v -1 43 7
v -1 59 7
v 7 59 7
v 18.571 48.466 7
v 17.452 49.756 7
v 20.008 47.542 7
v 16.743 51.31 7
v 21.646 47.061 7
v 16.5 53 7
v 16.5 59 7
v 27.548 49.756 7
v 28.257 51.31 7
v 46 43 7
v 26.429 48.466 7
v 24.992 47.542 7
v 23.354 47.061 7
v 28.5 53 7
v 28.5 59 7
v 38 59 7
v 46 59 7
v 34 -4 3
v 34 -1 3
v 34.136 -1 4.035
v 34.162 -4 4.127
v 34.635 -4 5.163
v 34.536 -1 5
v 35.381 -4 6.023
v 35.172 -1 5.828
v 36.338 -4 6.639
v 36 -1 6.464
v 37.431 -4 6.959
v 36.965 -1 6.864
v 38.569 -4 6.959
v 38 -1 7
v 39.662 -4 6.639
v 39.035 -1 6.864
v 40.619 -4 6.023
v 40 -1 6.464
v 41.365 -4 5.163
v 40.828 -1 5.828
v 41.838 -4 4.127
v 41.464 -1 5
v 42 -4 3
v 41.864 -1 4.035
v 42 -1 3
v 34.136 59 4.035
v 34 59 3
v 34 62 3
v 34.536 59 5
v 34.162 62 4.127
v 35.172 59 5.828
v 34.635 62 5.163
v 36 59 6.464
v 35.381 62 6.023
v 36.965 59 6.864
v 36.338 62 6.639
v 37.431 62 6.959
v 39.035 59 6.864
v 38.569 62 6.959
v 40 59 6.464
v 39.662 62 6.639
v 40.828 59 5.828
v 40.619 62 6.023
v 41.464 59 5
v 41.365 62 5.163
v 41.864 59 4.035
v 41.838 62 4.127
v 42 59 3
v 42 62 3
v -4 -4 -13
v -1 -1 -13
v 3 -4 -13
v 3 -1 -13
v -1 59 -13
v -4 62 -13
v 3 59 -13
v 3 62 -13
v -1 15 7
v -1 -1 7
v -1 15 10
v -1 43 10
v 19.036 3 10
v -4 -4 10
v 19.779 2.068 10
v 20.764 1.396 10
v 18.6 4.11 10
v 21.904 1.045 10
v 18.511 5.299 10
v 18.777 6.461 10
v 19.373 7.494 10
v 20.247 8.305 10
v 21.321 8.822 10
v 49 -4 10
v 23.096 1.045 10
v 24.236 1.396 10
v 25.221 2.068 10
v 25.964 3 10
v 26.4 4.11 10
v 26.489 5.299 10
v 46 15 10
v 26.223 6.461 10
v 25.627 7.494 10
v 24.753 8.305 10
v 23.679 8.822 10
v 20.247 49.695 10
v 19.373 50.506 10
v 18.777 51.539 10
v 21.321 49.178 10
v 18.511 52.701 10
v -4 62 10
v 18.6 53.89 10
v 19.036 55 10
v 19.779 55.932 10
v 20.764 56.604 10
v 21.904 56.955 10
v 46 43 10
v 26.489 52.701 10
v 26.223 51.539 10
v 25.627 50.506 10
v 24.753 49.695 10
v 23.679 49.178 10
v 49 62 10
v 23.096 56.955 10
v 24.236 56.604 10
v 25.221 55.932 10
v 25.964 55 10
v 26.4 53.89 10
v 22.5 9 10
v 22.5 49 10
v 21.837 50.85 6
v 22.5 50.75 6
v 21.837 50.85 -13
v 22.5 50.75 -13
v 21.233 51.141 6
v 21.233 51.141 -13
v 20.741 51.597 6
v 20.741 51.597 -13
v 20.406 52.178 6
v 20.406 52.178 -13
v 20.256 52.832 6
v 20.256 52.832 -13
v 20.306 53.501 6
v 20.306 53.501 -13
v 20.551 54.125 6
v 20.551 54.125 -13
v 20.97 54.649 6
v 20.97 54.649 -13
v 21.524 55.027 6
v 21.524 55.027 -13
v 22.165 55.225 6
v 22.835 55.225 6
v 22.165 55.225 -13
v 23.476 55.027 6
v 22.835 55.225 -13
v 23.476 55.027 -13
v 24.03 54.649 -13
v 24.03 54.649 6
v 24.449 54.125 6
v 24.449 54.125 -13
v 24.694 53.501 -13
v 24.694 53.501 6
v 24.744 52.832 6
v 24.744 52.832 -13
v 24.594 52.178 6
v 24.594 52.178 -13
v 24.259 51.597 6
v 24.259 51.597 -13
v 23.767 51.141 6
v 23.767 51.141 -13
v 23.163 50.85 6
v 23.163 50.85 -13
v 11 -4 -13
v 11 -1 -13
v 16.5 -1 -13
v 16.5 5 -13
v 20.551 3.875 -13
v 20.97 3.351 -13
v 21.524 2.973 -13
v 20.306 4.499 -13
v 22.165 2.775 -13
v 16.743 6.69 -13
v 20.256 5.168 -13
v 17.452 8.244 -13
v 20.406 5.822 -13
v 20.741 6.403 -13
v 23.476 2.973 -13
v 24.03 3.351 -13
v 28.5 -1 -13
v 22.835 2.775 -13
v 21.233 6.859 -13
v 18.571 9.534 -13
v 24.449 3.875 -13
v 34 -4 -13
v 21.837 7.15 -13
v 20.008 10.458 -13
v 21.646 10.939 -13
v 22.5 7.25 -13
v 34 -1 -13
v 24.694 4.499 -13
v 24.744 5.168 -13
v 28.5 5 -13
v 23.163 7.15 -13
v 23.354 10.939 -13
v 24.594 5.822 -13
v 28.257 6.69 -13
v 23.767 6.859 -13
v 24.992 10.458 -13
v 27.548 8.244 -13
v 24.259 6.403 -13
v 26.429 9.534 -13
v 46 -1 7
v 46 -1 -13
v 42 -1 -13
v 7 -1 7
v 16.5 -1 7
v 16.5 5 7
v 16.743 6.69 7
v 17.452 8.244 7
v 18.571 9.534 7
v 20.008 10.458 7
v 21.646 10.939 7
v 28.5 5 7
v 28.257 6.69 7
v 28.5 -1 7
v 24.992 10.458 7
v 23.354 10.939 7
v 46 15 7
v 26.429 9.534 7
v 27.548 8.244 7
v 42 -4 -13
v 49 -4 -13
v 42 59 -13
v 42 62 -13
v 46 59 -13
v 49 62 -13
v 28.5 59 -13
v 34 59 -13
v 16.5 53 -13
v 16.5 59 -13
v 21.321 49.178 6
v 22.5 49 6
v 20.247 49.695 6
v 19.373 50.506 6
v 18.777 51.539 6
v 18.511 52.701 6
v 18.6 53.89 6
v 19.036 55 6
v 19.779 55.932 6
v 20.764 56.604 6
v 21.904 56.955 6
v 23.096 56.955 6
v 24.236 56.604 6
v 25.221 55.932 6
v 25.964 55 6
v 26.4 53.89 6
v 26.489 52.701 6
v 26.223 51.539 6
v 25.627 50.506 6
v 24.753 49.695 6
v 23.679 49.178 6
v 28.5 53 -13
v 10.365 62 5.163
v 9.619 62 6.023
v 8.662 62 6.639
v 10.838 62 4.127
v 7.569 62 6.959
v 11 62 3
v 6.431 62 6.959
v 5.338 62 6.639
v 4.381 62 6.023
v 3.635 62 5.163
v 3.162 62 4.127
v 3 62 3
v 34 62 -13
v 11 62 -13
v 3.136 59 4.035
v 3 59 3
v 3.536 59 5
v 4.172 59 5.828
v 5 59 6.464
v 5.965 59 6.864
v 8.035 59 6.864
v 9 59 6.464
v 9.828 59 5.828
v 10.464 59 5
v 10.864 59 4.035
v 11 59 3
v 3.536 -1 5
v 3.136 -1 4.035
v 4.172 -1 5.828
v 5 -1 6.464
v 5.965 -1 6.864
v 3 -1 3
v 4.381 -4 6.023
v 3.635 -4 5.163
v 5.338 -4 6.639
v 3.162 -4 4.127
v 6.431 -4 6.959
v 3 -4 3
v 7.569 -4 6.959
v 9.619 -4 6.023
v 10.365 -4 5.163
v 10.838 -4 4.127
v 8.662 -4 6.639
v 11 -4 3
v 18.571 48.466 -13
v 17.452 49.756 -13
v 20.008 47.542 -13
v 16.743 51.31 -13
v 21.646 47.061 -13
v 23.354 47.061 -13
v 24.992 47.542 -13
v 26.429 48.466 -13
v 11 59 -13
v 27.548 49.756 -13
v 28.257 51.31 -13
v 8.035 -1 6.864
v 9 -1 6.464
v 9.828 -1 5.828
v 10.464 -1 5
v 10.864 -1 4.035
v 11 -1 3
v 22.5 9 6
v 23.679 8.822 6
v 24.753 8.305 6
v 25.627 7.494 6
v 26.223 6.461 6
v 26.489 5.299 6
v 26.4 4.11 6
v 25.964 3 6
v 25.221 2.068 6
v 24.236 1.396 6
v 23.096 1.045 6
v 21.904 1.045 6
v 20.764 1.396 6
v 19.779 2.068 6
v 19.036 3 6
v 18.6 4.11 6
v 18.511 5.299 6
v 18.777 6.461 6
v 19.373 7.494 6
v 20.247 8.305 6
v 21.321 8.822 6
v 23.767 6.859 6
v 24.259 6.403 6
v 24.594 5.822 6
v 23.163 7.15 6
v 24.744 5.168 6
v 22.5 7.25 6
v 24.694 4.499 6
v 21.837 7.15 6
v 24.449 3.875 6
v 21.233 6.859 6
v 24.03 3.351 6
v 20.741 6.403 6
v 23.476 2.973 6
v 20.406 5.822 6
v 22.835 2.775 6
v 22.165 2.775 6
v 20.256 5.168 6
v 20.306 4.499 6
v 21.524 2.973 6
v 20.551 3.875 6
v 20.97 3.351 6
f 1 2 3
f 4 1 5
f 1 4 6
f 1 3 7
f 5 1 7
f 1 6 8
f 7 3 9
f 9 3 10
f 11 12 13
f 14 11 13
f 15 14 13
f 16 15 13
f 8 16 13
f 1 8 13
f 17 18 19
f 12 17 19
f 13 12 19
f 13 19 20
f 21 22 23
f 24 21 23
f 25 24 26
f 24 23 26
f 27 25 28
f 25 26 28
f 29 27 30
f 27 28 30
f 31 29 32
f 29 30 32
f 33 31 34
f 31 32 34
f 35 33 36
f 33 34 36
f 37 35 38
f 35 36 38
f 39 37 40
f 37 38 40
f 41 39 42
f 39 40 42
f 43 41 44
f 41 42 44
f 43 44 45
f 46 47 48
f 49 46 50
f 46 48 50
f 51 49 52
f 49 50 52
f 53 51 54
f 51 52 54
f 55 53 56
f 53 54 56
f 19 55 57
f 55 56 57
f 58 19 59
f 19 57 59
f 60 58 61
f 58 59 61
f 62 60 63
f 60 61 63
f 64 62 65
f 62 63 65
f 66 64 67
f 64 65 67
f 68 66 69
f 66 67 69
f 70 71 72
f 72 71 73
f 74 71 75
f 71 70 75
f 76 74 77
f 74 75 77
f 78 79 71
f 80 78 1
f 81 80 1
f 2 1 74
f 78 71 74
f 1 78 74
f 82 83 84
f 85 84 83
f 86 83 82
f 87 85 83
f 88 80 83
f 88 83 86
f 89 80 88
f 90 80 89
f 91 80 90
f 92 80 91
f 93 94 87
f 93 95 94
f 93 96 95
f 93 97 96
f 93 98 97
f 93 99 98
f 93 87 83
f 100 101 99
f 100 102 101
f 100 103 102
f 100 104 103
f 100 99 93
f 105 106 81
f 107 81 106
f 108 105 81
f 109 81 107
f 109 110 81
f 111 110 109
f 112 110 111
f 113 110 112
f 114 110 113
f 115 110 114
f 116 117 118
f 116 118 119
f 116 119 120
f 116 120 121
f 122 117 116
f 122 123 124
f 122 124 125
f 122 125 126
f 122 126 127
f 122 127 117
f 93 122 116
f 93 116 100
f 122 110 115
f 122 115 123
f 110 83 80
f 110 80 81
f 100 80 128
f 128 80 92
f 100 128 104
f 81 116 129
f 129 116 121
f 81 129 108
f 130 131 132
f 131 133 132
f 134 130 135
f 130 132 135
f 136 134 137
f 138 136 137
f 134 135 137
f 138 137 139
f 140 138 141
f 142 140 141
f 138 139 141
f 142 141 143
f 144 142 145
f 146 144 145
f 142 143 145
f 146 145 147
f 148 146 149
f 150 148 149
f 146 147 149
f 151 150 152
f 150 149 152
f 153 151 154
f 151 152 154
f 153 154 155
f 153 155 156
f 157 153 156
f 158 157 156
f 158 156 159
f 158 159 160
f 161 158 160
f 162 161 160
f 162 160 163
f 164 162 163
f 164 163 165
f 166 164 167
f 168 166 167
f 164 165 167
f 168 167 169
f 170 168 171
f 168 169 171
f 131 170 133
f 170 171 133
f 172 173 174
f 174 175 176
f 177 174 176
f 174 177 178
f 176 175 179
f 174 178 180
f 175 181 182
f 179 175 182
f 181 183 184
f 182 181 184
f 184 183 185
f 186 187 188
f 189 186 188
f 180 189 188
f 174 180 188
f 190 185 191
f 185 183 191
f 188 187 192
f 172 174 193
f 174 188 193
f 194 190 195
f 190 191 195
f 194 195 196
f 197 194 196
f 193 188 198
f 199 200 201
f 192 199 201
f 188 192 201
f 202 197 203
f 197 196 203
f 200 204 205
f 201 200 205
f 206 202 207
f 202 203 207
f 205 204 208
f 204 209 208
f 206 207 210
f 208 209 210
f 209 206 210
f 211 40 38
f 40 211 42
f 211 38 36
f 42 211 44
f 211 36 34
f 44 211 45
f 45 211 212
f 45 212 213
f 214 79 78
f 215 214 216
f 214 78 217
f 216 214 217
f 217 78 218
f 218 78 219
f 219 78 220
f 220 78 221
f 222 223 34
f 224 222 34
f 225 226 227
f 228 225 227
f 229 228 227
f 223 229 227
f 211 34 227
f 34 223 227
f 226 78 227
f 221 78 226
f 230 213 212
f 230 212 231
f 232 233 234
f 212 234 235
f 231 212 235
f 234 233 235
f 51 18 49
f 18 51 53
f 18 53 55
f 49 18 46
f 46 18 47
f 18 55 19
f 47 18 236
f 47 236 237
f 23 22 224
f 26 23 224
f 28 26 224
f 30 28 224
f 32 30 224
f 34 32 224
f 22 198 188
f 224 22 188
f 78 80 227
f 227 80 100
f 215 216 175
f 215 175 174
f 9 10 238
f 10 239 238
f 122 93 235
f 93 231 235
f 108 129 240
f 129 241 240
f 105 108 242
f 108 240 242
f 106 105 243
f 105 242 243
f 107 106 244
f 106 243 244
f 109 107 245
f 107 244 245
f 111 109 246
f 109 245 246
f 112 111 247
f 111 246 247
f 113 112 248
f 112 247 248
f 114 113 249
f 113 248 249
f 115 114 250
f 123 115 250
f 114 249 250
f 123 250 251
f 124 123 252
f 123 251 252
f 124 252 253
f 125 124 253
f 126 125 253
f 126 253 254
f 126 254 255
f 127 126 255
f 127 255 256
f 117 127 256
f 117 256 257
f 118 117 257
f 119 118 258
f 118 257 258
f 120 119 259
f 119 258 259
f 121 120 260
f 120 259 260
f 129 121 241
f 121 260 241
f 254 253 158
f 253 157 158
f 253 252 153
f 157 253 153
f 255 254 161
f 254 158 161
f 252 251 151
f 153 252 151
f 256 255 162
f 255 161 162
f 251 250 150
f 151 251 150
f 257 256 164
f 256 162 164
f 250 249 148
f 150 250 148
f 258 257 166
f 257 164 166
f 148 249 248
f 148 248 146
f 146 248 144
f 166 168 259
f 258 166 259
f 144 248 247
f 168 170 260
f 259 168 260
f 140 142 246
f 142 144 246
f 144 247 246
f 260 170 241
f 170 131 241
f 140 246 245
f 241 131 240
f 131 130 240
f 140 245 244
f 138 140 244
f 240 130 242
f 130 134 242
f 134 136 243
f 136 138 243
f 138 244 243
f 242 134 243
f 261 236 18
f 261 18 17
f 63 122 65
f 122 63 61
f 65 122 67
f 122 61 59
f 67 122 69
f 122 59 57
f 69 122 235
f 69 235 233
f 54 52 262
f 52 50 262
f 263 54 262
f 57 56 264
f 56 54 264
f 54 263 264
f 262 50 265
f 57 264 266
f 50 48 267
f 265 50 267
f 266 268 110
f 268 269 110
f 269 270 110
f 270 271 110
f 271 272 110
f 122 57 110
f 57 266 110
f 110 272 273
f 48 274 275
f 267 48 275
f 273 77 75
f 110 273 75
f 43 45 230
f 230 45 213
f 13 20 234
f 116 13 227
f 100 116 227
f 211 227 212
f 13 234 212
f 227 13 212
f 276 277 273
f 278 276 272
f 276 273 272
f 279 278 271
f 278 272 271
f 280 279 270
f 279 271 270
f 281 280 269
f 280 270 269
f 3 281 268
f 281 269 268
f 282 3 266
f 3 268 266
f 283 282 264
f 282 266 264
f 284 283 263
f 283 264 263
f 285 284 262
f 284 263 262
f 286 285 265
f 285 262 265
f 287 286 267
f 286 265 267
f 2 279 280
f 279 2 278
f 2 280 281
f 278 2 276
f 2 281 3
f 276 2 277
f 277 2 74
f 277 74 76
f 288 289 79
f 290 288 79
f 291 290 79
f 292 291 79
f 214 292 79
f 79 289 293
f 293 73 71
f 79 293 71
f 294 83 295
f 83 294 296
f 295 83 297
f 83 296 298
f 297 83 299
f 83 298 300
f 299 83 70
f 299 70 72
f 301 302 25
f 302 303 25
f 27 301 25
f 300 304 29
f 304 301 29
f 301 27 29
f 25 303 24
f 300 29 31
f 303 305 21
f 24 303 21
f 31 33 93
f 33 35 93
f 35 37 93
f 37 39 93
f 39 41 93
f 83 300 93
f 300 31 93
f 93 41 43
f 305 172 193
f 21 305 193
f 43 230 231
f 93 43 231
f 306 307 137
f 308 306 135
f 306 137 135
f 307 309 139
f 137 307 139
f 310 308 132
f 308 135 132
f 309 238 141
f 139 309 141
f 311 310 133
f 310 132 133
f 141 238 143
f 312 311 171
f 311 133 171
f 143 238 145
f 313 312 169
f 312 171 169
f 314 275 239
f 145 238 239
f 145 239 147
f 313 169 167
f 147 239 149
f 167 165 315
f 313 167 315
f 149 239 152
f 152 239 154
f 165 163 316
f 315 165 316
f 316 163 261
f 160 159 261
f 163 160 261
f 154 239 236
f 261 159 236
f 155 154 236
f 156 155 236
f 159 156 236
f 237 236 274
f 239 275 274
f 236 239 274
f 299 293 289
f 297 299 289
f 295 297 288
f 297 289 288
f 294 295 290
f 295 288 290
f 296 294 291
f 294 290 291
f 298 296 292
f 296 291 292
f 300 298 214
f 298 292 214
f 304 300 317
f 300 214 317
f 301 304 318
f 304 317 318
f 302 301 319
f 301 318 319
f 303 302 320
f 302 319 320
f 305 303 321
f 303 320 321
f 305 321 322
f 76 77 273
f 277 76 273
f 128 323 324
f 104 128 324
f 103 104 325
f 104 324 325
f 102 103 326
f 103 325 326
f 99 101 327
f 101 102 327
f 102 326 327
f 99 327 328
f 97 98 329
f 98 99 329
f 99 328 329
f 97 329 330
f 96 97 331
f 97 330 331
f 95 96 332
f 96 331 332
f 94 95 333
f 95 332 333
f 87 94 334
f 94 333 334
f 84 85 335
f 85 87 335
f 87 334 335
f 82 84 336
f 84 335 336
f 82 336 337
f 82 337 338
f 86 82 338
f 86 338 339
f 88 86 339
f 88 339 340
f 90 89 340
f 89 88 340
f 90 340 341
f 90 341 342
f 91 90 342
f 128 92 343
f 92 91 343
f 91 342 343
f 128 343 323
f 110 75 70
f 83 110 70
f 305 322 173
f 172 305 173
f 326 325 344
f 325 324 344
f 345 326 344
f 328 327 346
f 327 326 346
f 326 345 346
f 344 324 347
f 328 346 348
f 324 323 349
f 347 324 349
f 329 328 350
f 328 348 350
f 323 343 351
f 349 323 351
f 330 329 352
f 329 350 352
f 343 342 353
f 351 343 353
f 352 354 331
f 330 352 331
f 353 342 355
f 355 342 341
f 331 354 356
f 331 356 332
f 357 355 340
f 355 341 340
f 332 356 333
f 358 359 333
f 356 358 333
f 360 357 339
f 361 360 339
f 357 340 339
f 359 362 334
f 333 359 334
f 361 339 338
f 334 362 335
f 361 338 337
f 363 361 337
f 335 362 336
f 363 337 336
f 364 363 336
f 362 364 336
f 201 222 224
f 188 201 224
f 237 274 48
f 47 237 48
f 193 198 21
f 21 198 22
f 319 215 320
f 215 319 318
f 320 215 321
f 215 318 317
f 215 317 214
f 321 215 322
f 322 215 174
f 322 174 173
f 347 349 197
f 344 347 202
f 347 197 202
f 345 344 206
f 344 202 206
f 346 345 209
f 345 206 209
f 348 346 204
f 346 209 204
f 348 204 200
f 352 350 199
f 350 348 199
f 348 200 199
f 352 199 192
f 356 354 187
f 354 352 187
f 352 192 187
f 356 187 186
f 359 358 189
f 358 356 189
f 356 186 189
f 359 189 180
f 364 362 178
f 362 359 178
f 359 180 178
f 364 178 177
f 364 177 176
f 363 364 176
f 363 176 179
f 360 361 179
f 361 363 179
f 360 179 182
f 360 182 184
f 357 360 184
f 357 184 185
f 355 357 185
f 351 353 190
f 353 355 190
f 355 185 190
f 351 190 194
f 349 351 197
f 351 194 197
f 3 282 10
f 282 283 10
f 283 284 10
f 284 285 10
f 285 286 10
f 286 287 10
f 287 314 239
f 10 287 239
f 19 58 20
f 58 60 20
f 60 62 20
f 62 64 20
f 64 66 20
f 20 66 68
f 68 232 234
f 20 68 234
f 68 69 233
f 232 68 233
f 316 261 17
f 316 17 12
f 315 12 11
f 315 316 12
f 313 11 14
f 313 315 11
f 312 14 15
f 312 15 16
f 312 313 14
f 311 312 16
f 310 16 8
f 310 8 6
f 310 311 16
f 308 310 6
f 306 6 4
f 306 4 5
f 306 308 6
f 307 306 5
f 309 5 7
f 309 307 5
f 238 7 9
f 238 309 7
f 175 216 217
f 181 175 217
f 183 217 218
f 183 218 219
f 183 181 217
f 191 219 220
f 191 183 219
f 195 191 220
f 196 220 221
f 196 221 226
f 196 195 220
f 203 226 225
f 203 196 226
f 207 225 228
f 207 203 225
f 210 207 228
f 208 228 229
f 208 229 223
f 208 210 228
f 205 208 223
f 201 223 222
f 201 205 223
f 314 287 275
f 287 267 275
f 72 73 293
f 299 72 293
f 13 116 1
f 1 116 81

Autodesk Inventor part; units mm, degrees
ref_plane "YZ Plane" through (0, 0, 0) normal (1, 0, 0) x (0, 1, 0)
sketch "Sketch1" plane through (0, 0, 0) normal (0, 0, 1) x (1, 0, 0)
  line L0 (0, 0) -> (45, 0)
  line L1 (45, 0) -> (45, 58)
  line L2 (45, 58) -> (0, 58)
  line L3 (0, 58) -> (0, 0)
  circle A0 centre (22.5, 53) radius 2.75
  circle A1 centre (22.5, 5) radius 2.75
  line L4 (19.75, 58) -> (19.75, 53)
  line L5 (25.25, 58) -> (25.25, 53)
  line L6 (0, 42) -> (45, 42)
  line L7 (45, 42) -> (45, 16)
  line L8 (45, 16) -> (0, 16)
  line L9 (0, 16) -> (0, 42)
  circle A2 centre (22.5, 53) radius 6
  circle A3 centre (22.5, 5) radius 6
  line L10 (16.5, 5) -> (16.5, -1)
  line L11 (28.5, 5) -> (28.5, -1)
  line L12 (16.5, 53) -> (16.5, 59)
  line L13 (28.5, 53) -> (28.5, 59)
  line L14 (-1, 59) -> (46, 59)
  line L15 (46, 59) -> (46, -1)
  line L16 (46, -1) -> (-1, -1)
  line L17 (-1, -1) -> (-1, 59)
  line L18 (49, 62) -> (-4, 62)
  line L19 (-4, 62) -> (-4, -4)
  line L20 (-4, -4) -> (49, -4)
  line L21 (49, -4) -> (49, 62)
  line L22 (28.5, 59) -> (16.5, 59)
  line L23 (28.5, -1) -> (16.5, -1)
  point P0 (22.5, 58)
  dimension "d0" = 45
  dimension "d1" = 58
  dimension "d2" = 5.5
  dimension "d3" = 5.5
  dimension "d4" = 5
  dimension "d5" = 5
  dimension "d6" = 26
  dimension "d7" = 16
  dimension "d8" = 12
  dimension "d9" = 12
  dimension "d10" = 1
  dimension "d11" = 3
extrude "Extrusion1" add sketch "Sketch1" along normal blind 10 contours L21 L20 L19 L18
sketch "Sketch2" plane through (0, 0, 10) normal (0, 0, 1) x (1, 0, 0)
  line L0 (-1, 59) -> (46, 59) projected
  line L1 (46, 59) -> (46, -1) projected
  line L2 (-1, 59) -> (46, 59)
  line L3 (46, 59) -> (46, 43)
  line L4 (46, 43) -> (-1, 43)
  line L5 (-1, 43) -> (-1, 59)
  line L6 (-1, -1) -> (-1, 59) projected
  line L7 (46, -1) -> (-1, -1)
  line L8 (-1, -1) -> (-1, 15)
  line L9 (-1, 15) -> (46, 15)
  line L10 (46, 15) -> (46, -1)
  point P0 (0, 0)
  dimension "d14" = 16
  dimension "d15" = 16
extrude "Extrusion2" add sketch "Sketch2" against normal blind 3 contours L0 L1 L4 L5 | L9 L1 L7 L6
sketch "Sketch3" plane through (0, 0, 0) normal (0, 0, -1) x (-1, 0, 0)
  arc A0 (-28.5, 53) -> (-16.5, 53) centre (-22.5, 53) ccw
  line L0 (-46, 59) -> (1, 59) projected
  line L1 (-28.5, 59) -> (-28.5, 53)
  line L2 (-16.5, 59) -> (-16.5, 53)
  line L3 (-16.5, 59) -> (-28.5, 59)
  point P0 (0, 0)
  dimension "d18" = 12
extrude "Extrusion3" add sketch "Sketch3" against normal up to surface (7 mm away)
ref_plane "Work Plane1" through (-4, 29, 0) normal (0, 1, 0) x (1, 0, 0)
mirror "Mirror1" about plane through (-4, 29, 0) normal (0, 1, 0) of "Extrusion3"
thicken "Thicken1" operation add thickness 13 both sides no extend neighbours yes toward (0, 0, -1) faces at (48, 39, 0)
sketch "Sketch4" plane through (-4, 62, 10) normal (0, 1, 0) x (1, 0, 0)
  line L0 (3, 3) -> (3, 0) projected
  line L1 (3, 0) -> (3, 3) projected
  line L2 (3, 23) -> (3, 3) projected
  line L3 (3, 23) -> (3, 3) projected
  line L4 (50, 0) -> (50, 3) projected
  line L5 (50, 23) -> (50, 3) projected
  line L6 (50, 23) -> (50, 3) projected
  line L7 (50, 3) -> (50, 0) projected
  line L8 (20.5, 3) -> (32.5, 3) projected
  line L9 (50, 3) -> (32.5, 3) projected
  line L10 (50, 3) -> (3, 3) projected
  line L11 (20.5, 3) -> (3, 3) projected
  line L12 (32.5, 23) -> (32.5, 3) projected
  line L13 (32.5, 23) -> (32.5, 3) projected
  line L14 (20.5, 23) -> (20.5, 3) projected
  line L15 (20.5, 3) -> (20.5, 23) projected
  line L16 (53, 23) -> (0, 23) projected
  line L17 (42, 23) -> (42, 7) construction
  line L18 (38, 23) -> (38, 7)
  line L19 (46, 7) -> (46, 23)
  arc A0 (46, 23) -> (38, 23) centre (42, 23) ccw
  arc A1 (38, 7) -> (46, 7) centre (42, 7) ccw
  point P0 (4, 10)
  point P1 (42, 15)
  dimension "d23" = 4
  dimension "d24" = 8
  dimension "d25" = 16
extrude "Extrusion4" cut sketch "Sketch4" against normal through all contours L16 L19 A1 L18
ref_plane "Work Plane2" through (22.5, -4, 10) normal (1, 0, 0) x (0, 0, -1)
mirror "Mirror2" about plane through (22.5, -4, 10) normal (1, 0, 0) of "Extrusion4"
hole "Hole1" at (22.5, 53, 10) direction (0, 0, -1) diameter 4.5 end through all counterbore diameter 8 counterbore depth 4 clearance for "Socket Head Cap Screw" size "M4" standard "Ansi Metric M Profile"
mirror "Mirror3" about plane through (-4, 29, 0) normal (0, 1, 0) of "Hole1"
properties part number "ssr-cover"
